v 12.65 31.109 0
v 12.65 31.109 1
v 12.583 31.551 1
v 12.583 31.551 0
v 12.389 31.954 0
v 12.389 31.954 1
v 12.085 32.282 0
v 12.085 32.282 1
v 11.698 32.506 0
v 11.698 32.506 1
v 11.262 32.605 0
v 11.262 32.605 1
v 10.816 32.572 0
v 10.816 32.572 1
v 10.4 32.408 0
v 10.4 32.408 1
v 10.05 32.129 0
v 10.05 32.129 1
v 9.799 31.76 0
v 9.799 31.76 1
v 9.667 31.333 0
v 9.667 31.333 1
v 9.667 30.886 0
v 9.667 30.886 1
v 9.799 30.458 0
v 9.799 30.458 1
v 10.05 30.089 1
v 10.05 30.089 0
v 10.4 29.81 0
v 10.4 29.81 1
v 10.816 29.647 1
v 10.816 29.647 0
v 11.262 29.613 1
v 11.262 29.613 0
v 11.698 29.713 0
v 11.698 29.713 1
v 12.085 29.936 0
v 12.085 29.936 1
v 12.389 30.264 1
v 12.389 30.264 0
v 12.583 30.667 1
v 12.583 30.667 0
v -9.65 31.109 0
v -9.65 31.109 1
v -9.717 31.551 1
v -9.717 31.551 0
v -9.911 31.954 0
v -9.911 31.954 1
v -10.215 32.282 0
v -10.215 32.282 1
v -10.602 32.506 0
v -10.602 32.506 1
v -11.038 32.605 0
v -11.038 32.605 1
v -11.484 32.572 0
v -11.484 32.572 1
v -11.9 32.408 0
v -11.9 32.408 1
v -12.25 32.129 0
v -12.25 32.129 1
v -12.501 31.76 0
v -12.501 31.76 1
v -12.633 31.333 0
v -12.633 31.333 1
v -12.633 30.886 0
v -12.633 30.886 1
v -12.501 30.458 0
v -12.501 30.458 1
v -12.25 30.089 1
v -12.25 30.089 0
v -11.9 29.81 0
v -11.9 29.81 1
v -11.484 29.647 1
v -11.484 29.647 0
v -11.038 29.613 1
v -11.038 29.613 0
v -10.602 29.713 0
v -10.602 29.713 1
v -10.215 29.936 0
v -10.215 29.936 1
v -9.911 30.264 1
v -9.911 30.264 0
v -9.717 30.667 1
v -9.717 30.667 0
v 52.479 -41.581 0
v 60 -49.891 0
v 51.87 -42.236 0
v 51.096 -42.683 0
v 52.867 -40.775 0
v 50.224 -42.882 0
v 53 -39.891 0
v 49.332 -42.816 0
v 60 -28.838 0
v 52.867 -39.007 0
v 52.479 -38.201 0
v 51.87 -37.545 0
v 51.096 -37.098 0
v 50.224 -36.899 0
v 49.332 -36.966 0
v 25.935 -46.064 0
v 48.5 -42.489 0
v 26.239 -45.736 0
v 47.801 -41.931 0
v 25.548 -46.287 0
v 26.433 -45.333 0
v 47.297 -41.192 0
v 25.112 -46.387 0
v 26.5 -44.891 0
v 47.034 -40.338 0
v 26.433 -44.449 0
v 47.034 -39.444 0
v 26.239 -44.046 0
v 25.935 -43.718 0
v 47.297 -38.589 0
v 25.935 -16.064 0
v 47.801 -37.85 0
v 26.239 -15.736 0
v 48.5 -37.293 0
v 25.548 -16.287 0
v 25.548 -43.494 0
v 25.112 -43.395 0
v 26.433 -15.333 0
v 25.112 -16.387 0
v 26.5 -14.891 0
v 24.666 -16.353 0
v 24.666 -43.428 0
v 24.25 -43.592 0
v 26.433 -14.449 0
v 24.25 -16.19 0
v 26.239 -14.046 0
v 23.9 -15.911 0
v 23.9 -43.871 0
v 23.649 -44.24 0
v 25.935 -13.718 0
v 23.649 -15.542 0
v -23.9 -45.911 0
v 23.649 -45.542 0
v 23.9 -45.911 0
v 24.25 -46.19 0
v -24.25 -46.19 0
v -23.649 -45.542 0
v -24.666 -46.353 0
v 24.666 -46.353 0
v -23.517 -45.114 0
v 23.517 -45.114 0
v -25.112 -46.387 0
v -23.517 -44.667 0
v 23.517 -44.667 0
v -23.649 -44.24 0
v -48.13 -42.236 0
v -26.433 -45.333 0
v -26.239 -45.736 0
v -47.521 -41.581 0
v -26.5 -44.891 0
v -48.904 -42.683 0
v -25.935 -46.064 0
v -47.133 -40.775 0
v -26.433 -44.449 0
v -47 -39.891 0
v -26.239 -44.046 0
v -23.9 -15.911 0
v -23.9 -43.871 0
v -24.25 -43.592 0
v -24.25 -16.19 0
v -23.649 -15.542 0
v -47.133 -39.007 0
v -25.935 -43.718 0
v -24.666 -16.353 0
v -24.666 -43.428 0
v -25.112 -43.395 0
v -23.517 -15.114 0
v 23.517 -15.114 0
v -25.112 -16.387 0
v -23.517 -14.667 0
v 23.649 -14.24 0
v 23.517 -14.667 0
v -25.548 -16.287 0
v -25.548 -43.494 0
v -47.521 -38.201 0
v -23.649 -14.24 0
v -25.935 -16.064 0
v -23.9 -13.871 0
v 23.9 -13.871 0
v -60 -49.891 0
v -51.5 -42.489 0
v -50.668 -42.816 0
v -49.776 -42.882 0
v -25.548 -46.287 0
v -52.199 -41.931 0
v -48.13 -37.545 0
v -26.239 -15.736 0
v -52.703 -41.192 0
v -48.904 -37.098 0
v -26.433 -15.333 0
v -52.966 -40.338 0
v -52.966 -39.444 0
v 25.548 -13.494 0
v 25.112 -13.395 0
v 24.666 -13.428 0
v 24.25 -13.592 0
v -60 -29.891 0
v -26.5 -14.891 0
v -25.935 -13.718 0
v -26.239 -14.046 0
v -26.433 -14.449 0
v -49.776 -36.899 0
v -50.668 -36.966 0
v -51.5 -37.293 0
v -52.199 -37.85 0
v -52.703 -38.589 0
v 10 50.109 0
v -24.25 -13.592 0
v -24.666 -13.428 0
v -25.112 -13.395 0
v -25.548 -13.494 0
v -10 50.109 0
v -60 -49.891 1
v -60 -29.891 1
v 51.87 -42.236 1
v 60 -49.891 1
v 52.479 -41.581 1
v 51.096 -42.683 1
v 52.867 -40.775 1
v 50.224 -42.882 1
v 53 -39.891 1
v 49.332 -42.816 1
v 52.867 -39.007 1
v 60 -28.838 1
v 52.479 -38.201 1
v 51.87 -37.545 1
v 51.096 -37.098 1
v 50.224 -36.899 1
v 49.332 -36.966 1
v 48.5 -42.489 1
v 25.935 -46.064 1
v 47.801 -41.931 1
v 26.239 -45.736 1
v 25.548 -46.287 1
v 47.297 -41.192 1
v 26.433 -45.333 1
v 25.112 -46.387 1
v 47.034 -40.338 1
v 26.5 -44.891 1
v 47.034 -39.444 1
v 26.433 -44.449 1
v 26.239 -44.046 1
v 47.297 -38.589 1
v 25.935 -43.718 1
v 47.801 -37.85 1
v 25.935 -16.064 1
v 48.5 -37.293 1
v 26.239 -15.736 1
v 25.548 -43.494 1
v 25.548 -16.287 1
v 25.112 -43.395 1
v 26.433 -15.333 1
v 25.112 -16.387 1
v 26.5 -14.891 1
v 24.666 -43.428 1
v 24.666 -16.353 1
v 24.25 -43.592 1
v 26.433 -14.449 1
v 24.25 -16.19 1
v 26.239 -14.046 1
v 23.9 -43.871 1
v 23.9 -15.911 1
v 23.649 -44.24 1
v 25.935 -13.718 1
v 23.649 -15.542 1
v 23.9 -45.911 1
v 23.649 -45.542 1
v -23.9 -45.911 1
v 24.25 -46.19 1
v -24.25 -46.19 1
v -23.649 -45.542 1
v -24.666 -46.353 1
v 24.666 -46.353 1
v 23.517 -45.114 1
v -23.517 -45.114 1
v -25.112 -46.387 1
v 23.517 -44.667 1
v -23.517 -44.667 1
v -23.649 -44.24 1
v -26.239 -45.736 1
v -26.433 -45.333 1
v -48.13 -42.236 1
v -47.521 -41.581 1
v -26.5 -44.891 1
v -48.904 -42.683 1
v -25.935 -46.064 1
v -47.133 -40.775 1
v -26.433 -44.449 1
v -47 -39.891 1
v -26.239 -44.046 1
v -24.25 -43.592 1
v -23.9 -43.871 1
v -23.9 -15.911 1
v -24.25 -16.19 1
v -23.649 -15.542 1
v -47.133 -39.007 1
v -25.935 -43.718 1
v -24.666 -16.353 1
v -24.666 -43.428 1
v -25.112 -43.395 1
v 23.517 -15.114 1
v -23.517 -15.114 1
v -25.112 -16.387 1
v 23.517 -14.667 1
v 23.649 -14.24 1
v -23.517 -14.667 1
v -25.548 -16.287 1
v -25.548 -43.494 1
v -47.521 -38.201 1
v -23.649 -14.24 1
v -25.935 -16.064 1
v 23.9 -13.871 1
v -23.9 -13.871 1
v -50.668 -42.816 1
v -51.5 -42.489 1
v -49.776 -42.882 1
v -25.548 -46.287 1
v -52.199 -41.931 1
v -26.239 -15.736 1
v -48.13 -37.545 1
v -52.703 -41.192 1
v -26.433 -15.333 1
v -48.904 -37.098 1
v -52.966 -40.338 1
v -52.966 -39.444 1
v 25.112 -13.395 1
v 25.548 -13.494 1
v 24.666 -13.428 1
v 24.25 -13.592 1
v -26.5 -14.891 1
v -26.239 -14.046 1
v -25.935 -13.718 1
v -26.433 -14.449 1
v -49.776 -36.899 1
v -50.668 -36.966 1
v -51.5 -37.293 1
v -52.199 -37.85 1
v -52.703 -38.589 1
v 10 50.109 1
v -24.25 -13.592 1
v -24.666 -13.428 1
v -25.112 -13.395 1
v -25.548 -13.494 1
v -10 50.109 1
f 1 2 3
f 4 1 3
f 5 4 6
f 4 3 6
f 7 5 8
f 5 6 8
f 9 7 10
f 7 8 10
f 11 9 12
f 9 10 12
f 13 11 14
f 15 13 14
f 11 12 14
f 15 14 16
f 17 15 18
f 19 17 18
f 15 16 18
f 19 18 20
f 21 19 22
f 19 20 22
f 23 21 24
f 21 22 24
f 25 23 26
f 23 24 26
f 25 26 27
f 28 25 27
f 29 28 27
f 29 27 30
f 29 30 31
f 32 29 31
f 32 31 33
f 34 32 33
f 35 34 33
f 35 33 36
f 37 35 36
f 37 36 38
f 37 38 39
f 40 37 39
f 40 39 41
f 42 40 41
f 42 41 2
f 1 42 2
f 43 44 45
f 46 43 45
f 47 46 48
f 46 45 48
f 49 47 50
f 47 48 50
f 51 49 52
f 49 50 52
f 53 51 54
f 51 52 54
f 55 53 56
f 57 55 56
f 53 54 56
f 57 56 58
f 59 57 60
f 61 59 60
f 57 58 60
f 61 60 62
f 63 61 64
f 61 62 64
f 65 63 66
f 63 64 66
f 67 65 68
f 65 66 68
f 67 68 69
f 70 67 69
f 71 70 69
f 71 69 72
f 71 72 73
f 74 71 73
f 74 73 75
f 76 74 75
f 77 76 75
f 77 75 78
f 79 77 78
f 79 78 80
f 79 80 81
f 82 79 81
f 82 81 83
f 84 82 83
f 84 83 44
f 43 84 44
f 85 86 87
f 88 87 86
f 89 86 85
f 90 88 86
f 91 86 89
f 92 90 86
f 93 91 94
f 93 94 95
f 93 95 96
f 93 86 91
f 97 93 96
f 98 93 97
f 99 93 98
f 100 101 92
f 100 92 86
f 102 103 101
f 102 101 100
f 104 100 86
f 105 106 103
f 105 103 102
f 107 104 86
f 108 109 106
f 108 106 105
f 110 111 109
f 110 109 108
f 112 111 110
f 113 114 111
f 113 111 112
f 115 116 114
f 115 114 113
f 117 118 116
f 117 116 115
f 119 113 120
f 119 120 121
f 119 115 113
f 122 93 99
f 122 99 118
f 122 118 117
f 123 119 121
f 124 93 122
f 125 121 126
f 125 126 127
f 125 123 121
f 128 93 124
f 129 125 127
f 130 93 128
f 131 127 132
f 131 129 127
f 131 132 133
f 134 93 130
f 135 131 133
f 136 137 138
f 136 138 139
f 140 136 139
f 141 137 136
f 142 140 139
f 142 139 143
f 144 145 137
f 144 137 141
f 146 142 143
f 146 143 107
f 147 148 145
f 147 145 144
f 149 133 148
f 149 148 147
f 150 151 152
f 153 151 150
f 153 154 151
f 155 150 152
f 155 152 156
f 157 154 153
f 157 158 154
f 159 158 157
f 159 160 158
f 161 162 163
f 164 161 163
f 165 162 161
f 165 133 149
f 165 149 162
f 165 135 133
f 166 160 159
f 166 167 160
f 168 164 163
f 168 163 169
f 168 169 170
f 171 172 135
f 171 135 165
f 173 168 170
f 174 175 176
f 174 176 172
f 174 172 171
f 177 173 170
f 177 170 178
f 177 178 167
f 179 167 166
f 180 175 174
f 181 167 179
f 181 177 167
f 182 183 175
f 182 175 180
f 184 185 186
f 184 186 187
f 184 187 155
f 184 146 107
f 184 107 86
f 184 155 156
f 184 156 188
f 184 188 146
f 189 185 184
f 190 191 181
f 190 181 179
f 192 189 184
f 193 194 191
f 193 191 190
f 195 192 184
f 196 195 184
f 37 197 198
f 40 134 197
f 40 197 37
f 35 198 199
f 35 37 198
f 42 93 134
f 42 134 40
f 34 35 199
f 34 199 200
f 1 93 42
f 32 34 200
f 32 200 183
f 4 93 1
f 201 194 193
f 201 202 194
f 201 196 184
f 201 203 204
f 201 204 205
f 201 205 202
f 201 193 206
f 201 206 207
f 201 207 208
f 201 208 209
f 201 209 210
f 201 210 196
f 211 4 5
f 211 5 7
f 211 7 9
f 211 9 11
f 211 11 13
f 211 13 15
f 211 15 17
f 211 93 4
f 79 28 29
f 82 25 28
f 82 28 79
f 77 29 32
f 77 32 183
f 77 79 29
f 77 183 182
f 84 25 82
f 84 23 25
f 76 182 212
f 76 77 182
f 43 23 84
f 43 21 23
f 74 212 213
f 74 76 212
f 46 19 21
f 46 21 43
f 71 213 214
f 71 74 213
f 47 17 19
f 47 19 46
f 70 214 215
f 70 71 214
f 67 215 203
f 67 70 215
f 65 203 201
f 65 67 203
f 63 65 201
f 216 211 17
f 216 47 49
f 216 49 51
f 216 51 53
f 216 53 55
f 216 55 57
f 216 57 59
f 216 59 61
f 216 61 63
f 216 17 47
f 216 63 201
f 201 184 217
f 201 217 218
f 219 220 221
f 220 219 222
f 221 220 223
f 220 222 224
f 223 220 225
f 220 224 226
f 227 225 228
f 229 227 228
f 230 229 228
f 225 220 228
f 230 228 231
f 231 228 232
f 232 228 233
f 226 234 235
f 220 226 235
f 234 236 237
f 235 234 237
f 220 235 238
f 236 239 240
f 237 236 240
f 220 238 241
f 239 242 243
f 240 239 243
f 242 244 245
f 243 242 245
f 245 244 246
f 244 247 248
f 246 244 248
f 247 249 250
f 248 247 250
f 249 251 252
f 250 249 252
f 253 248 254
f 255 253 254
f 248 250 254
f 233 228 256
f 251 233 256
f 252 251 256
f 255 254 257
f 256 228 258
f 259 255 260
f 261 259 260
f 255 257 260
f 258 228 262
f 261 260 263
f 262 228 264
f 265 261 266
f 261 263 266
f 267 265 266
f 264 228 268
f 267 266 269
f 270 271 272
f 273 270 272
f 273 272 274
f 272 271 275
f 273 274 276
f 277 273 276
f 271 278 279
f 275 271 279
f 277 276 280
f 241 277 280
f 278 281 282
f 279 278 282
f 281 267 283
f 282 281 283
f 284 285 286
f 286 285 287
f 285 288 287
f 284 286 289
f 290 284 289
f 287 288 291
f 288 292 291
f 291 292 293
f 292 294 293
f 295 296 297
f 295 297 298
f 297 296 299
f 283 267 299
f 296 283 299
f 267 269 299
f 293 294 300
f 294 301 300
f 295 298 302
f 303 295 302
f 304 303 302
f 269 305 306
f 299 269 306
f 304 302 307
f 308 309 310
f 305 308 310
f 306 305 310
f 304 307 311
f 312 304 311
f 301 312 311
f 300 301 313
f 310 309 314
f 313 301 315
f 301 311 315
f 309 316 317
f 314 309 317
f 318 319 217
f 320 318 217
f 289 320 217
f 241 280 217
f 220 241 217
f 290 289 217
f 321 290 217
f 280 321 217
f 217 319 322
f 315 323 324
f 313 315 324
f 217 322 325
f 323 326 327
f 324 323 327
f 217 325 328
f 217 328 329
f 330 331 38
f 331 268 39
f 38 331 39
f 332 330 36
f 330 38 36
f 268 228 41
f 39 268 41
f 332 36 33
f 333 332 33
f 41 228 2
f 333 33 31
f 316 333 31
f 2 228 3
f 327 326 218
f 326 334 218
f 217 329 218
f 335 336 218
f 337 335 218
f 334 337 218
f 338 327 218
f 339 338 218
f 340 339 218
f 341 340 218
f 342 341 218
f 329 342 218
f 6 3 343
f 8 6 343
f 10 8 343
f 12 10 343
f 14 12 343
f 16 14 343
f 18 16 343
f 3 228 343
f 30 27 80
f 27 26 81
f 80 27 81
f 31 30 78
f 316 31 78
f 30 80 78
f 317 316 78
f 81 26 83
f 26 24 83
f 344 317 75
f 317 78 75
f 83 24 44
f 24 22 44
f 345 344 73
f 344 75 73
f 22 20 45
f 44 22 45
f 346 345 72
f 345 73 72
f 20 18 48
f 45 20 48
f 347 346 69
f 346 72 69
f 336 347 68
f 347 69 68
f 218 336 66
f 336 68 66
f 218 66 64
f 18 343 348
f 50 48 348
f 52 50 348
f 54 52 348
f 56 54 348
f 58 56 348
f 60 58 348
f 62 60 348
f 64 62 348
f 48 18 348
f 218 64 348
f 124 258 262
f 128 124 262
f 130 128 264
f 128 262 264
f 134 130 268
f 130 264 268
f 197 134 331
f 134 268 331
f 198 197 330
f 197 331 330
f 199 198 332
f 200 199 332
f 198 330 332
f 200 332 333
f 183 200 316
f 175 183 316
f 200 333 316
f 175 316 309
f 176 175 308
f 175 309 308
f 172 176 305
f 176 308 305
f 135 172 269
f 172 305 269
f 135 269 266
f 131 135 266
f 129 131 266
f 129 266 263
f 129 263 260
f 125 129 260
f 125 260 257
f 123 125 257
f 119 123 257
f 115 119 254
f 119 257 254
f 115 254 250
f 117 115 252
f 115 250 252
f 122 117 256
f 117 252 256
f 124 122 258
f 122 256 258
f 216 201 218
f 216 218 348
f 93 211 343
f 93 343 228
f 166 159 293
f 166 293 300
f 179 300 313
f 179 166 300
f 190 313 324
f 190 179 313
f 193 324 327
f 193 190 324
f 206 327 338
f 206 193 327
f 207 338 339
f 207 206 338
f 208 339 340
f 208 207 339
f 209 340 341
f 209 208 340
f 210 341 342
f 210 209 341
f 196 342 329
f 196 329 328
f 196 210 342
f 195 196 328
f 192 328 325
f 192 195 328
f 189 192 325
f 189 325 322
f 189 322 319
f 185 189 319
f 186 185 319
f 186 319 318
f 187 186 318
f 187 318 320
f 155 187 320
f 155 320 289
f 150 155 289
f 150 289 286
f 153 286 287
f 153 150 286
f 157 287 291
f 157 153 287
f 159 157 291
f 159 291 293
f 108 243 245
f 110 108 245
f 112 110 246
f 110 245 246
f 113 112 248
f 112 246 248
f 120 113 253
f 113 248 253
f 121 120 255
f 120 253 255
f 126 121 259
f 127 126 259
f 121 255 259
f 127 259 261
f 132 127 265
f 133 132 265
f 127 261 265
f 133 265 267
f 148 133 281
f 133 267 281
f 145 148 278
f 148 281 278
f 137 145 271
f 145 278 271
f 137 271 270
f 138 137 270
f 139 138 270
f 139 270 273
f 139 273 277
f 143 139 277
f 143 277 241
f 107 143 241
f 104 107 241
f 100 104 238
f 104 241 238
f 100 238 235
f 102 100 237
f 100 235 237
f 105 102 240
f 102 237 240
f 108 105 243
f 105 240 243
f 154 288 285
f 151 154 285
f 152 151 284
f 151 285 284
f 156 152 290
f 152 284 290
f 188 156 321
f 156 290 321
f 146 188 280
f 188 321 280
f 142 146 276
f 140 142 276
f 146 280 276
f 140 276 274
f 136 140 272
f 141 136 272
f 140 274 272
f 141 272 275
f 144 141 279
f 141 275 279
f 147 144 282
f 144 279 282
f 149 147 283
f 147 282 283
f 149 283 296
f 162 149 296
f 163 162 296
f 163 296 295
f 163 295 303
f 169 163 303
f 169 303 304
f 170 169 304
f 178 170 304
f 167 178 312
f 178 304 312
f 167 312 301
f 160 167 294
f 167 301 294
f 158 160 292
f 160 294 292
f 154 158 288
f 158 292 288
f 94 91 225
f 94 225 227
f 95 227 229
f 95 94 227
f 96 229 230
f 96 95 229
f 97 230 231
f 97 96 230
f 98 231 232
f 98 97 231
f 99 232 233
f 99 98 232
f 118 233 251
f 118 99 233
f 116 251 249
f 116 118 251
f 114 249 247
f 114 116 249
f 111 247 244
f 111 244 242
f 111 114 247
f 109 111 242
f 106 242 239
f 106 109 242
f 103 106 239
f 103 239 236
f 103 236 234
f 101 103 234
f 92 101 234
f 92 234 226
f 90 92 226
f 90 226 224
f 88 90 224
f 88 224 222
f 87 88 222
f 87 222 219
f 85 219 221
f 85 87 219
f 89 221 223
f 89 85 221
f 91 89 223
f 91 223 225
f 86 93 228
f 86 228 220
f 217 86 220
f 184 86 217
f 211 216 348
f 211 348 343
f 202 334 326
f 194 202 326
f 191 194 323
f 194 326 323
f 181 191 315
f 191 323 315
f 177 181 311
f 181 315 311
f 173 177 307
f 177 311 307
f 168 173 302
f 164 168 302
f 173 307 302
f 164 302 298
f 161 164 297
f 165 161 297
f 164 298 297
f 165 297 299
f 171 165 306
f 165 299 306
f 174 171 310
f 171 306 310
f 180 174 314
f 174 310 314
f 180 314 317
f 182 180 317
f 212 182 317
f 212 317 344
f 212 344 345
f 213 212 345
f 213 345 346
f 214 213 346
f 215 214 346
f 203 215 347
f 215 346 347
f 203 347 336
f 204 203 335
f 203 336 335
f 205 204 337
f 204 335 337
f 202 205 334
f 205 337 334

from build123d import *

# Parameters (mm, degrees)
SKETCH_1_R          = 3
EXTRUDE_2_DEPTH     = 1
SKETCH_3_R          = 1.5
CUT_EXTRUDE_1_DEPTH = 10
SKETCH_5_R          = 1.5
CUT_EXTRUDE_2_DEPTH = 1


with BuildPart() as part:
    # 草图1 → 凸台-拉伸2 (new body)
    with BuildSketch(Plane.XY):
        Polygon((-10, 50.109212084), (10, 50.109212084), (60, -28.838156337), (60, -49.890787916), (-60, -49.890787916), (-60, -29.890787916), align=None)
        with Locations((-50, -39.890787916)):
            Circle(SKETCH_1_R, mode=Mode.SUBTRACT)
        with Locations((50, -39.890787916)):
            Circle(SKETCH_1_R, mode=Mode.SUBTRACT)
    extrude(amount=EXTRUDE_2_DEPTH)

    # 草图3 → 切除-拉伸1 (cut)
    with BuildSketch(Plane.XY.offset(1)):
        with Locations((-11.15, 31.109212084)):
            Circle(SKETCH_3_R)
        with Locations((11.15, 31.109212084)):
            Circle(SKETCH_3_R)
    extrude(amount=-CUT_EXTRUDE_1_DEPTH, mode=Mode.SUBTRACT)

    # 草图5 → 切除-拉伸2 (cut)
    with BuildSketch(Plane.XY.offset(1)):
        with Locations((25, -14.890787916)):
            Circle(SKETCH_5_R)
        with Locations((25, -44.890787916)):
            Circle(SKETCH_5_R)
        with Locations(Location((-25, -44.890787916, 0), (0, 0, 180))):
            Circle(SKETCH_5_R)
        with Locations(Location((-25, -14.890787916, 0), (0, 0, 180))):
            Circle(SKETCH_5_R)
    extrude(amount=-CUT_EXTRUDE_2_DEPTH, mode=Mode.SUBTRACT)


solid = part.part
